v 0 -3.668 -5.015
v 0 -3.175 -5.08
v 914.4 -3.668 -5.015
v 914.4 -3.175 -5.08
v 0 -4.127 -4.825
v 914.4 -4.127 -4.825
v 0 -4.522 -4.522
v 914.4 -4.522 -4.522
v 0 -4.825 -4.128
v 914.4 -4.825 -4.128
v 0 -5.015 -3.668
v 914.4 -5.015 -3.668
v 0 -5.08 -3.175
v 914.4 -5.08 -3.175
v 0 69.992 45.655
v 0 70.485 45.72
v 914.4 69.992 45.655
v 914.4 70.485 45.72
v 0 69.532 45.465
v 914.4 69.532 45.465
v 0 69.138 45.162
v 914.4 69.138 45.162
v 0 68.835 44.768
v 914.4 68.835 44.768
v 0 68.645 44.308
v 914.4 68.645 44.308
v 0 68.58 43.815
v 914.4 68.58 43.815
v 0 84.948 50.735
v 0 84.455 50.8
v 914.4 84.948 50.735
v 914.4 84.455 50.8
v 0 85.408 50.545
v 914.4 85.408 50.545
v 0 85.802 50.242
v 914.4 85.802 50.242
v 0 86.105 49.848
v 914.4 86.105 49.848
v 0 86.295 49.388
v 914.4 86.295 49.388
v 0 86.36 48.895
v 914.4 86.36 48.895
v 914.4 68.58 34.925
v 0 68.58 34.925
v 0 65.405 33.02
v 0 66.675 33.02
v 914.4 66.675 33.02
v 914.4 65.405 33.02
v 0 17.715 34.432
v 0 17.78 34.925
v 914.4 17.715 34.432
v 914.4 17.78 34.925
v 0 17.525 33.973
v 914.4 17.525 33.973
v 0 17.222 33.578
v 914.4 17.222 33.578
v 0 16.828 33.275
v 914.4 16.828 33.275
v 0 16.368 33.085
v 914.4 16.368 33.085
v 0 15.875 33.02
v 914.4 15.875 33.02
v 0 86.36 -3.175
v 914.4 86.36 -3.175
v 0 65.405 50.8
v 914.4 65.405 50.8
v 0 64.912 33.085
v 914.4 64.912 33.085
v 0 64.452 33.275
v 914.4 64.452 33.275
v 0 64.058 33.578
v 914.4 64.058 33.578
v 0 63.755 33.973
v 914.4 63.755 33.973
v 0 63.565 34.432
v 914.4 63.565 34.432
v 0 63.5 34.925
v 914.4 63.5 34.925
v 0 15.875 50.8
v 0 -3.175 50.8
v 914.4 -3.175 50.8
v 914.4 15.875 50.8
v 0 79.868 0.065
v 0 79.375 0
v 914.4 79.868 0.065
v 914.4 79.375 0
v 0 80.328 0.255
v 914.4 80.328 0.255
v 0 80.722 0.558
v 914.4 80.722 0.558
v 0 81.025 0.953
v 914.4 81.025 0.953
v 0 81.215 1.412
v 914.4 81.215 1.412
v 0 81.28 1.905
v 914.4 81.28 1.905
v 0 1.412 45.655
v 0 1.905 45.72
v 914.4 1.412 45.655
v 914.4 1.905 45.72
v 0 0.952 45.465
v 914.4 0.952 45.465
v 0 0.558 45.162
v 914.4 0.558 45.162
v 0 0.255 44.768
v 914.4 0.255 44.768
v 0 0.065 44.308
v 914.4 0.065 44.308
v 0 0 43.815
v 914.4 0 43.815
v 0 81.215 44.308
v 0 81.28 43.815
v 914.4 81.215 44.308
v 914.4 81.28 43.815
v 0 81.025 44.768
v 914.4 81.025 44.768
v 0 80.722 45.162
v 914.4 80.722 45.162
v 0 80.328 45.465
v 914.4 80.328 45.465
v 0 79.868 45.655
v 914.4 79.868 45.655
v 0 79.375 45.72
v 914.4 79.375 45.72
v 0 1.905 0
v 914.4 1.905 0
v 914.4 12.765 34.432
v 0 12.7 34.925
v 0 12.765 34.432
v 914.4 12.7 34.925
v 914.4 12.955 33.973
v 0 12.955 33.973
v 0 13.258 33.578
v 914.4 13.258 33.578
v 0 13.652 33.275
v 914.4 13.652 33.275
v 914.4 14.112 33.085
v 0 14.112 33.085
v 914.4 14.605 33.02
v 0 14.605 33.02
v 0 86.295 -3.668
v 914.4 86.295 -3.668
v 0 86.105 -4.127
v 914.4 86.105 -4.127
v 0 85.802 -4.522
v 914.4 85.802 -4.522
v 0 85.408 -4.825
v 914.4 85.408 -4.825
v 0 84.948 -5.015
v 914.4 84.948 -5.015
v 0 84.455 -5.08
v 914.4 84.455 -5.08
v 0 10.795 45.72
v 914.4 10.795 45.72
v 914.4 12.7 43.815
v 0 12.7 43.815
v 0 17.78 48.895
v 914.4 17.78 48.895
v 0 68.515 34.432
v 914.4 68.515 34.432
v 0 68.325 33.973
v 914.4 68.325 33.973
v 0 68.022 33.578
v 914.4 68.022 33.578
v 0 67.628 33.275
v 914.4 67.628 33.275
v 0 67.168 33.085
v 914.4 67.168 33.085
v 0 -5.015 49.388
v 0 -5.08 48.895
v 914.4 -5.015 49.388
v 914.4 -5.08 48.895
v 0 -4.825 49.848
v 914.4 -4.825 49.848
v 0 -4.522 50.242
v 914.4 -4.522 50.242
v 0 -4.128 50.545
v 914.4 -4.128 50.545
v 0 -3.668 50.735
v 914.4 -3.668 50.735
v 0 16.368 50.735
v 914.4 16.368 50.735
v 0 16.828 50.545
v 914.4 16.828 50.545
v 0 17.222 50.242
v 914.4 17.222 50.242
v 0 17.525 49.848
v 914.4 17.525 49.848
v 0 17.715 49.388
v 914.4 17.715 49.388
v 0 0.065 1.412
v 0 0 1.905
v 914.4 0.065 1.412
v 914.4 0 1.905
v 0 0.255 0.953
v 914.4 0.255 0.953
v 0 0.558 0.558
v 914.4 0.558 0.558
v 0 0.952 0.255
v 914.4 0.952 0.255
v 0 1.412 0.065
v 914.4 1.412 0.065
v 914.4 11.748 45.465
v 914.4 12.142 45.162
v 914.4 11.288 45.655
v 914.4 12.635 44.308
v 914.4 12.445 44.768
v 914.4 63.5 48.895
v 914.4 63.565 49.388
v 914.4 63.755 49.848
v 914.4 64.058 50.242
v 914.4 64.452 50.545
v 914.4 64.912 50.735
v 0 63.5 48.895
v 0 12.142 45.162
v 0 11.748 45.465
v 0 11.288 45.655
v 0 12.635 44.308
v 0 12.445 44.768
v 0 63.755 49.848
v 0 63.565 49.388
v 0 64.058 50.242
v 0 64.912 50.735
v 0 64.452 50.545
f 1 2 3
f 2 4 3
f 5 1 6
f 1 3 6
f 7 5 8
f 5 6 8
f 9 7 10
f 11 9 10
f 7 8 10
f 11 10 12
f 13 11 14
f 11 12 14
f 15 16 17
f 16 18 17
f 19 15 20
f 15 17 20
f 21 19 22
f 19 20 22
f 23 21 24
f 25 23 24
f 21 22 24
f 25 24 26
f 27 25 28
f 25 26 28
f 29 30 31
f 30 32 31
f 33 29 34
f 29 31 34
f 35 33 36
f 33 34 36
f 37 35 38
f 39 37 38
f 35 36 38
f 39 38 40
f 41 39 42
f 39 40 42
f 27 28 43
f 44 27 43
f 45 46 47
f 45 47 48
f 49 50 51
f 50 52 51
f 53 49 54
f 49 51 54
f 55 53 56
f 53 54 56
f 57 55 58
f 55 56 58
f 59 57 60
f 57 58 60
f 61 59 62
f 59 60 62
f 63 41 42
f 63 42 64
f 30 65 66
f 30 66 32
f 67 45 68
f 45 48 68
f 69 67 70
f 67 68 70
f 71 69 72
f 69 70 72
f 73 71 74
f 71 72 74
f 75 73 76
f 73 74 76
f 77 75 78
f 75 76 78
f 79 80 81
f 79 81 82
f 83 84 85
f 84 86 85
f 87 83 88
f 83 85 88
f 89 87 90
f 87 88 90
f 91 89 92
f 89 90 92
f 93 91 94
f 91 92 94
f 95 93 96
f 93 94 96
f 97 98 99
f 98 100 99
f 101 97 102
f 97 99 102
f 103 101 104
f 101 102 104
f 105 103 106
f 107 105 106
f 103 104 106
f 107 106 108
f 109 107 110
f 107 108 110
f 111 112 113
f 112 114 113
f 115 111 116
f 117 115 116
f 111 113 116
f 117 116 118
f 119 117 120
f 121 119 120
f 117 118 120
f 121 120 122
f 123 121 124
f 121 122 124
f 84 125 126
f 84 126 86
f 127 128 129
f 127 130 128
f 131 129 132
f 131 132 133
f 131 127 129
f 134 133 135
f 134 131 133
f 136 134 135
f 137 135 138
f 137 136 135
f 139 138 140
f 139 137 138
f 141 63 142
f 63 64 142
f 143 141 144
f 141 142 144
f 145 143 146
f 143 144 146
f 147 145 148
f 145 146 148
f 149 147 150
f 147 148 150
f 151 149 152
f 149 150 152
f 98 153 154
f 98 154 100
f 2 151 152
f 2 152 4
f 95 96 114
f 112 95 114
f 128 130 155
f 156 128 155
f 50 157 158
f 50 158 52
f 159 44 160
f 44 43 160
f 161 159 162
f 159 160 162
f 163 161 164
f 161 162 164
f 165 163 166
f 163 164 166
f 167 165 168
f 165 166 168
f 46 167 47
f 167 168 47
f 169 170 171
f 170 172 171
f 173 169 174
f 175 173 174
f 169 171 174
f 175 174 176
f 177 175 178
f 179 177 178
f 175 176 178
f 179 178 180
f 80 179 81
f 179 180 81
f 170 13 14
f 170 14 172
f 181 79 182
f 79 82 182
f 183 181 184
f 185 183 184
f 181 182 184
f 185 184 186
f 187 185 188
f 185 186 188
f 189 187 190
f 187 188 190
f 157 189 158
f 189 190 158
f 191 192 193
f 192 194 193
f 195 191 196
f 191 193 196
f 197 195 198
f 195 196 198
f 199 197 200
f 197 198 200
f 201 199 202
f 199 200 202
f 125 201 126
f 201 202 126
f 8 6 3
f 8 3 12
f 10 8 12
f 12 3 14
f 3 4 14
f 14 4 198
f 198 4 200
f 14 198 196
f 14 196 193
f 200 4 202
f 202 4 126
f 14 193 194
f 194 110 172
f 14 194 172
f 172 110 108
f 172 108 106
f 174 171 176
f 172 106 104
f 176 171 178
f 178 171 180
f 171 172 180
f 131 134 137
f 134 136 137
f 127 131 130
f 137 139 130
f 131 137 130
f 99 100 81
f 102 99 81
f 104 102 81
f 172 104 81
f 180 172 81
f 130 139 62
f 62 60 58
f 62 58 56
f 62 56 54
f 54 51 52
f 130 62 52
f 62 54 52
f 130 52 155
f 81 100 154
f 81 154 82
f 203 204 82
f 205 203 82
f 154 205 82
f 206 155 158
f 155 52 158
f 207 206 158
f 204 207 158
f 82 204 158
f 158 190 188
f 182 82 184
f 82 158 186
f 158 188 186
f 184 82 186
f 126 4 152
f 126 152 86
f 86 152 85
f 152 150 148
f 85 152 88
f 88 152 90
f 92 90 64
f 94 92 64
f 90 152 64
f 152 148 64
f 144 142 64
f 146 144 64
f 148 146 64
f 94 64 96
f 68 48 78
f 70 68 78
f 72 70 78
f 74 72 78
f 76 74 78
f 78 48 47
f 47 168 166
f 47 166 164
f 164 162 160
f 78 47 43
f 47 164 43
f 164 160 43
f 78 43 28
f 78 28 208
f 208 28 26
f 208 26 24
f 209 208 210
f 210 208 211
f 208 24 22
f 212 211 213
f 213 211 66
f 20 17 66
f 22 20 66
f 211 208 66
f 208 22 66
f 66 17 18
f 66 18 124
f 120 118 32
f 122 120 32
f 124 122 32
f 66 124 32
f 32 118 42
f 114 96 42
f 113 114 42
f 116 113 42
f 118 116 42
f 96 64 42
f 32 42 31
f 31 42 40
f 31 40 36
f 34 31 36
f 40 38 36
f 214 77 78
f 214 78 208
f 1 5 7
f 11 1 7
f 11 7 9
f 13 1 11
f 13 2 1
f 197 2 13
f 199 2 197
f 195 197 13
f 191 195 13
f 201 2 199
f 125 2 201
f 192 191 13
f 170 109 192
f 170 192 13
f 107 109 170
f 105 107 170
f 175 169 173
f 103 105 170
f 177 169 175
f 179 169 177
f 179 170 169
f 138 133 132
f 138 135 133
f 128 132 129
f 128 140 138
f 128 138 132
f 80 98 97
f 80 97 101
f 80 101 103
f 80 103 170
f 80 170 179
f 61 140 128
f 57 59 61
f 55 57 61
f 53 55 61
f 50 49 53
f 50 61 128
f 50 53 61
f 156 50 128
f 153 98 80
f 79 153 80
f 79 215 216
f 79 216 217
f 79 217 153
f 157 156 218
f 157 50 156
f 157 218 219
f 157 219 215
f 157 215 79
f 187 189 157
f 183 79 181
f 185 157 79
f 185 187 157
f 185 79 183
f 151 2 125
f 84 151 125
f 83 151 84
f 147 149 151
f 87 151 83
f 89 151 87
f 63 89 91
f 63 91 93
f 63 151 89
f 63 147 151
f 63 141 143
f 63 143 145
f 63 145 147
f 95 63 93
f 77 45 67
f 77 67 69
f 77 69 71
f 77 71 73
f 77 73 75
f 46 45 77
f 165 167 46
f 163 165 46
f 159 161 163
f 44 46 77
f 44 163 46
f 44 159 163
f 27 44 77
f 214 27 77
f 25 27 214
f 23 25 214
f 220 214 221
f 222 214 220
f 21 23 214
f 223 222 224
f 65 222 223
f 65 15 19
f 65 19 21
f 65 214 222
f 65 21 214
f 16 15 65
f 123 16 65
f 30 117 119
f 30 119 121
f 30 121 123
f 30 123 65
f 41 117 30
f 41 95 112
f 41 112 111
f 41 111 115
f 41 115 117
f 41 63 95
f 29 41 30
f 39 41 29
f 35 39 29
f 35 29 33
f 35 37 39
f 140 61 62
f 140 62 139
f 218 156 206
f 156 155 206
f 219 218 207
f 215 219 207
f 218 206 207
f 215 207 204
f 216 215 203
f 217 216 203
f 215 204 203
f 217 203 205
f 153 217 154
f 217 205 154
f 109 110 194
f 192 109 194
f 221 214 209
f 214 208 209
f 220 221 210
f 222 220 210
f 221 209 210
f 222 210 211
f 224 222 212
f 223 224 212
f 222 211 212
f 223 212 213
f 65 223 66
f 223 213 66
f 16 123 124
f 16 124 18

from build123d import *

# Parameters (mm, degrees)
EXTRUDE_THIN1_DEPTH = 914.4
FILLET1_R           = 1.905


with BuildPart() as part:
    # Sketch1 → Extrude-Thin1 (new body)
    with BuildSketch(Plane(origin=(0, 0, 0), x_dir=(0, 0, -1), z_dir=(1, 0, 0))):
        Polygon((-33.02, 12.7), (-45.72, 12.7), (-45.72, 0), (0, 0), (0, 81.28), (-45.72, 81.28), (-45.72, 68.58), (-33.02, 68.58), (-33.02, 63.5), (-50.8, 63.5), (-50.8, 86.36), (5.08, 86.36), (5.08, -5.08), (-50.8, -5.08), (-50.8, 17.78), (-33.02, 17.78), align=None)
    extrude(amount=EXTRUDE_THIN1_DEPTH)

    # Fillet1
    fillet1_edges = [part.edges().sort_by_distance(p)[0] for p in [
        (457.2, 12.7, 45.72),
        (457.2, 0, 45.72),
        (457.2, 0, 0),
        (457.2, 81.28, 0),
        (457.2, 81.28, 45.72),
        (457.2, 68.58, 45.72),
        (457.2, 68.58, 33.02),
        (457.2, 63.5, 33.02),
        (457.2, 63.5, 50.8),
        (457.2, 86.36, 50.8),
        (457.2, 86.36, -5.08),
        (457.2, -5.08, -5.08),
        (457.2, -5.08, 50.8),
        (457.2, 17.78, 50.8),
        (457.2, 17.78, 33.02),
        (457.2, 12.7, 33.02),
    ]]
    fillet(fillet1_edges, radius=FILLET1_R)


solid = part.part
